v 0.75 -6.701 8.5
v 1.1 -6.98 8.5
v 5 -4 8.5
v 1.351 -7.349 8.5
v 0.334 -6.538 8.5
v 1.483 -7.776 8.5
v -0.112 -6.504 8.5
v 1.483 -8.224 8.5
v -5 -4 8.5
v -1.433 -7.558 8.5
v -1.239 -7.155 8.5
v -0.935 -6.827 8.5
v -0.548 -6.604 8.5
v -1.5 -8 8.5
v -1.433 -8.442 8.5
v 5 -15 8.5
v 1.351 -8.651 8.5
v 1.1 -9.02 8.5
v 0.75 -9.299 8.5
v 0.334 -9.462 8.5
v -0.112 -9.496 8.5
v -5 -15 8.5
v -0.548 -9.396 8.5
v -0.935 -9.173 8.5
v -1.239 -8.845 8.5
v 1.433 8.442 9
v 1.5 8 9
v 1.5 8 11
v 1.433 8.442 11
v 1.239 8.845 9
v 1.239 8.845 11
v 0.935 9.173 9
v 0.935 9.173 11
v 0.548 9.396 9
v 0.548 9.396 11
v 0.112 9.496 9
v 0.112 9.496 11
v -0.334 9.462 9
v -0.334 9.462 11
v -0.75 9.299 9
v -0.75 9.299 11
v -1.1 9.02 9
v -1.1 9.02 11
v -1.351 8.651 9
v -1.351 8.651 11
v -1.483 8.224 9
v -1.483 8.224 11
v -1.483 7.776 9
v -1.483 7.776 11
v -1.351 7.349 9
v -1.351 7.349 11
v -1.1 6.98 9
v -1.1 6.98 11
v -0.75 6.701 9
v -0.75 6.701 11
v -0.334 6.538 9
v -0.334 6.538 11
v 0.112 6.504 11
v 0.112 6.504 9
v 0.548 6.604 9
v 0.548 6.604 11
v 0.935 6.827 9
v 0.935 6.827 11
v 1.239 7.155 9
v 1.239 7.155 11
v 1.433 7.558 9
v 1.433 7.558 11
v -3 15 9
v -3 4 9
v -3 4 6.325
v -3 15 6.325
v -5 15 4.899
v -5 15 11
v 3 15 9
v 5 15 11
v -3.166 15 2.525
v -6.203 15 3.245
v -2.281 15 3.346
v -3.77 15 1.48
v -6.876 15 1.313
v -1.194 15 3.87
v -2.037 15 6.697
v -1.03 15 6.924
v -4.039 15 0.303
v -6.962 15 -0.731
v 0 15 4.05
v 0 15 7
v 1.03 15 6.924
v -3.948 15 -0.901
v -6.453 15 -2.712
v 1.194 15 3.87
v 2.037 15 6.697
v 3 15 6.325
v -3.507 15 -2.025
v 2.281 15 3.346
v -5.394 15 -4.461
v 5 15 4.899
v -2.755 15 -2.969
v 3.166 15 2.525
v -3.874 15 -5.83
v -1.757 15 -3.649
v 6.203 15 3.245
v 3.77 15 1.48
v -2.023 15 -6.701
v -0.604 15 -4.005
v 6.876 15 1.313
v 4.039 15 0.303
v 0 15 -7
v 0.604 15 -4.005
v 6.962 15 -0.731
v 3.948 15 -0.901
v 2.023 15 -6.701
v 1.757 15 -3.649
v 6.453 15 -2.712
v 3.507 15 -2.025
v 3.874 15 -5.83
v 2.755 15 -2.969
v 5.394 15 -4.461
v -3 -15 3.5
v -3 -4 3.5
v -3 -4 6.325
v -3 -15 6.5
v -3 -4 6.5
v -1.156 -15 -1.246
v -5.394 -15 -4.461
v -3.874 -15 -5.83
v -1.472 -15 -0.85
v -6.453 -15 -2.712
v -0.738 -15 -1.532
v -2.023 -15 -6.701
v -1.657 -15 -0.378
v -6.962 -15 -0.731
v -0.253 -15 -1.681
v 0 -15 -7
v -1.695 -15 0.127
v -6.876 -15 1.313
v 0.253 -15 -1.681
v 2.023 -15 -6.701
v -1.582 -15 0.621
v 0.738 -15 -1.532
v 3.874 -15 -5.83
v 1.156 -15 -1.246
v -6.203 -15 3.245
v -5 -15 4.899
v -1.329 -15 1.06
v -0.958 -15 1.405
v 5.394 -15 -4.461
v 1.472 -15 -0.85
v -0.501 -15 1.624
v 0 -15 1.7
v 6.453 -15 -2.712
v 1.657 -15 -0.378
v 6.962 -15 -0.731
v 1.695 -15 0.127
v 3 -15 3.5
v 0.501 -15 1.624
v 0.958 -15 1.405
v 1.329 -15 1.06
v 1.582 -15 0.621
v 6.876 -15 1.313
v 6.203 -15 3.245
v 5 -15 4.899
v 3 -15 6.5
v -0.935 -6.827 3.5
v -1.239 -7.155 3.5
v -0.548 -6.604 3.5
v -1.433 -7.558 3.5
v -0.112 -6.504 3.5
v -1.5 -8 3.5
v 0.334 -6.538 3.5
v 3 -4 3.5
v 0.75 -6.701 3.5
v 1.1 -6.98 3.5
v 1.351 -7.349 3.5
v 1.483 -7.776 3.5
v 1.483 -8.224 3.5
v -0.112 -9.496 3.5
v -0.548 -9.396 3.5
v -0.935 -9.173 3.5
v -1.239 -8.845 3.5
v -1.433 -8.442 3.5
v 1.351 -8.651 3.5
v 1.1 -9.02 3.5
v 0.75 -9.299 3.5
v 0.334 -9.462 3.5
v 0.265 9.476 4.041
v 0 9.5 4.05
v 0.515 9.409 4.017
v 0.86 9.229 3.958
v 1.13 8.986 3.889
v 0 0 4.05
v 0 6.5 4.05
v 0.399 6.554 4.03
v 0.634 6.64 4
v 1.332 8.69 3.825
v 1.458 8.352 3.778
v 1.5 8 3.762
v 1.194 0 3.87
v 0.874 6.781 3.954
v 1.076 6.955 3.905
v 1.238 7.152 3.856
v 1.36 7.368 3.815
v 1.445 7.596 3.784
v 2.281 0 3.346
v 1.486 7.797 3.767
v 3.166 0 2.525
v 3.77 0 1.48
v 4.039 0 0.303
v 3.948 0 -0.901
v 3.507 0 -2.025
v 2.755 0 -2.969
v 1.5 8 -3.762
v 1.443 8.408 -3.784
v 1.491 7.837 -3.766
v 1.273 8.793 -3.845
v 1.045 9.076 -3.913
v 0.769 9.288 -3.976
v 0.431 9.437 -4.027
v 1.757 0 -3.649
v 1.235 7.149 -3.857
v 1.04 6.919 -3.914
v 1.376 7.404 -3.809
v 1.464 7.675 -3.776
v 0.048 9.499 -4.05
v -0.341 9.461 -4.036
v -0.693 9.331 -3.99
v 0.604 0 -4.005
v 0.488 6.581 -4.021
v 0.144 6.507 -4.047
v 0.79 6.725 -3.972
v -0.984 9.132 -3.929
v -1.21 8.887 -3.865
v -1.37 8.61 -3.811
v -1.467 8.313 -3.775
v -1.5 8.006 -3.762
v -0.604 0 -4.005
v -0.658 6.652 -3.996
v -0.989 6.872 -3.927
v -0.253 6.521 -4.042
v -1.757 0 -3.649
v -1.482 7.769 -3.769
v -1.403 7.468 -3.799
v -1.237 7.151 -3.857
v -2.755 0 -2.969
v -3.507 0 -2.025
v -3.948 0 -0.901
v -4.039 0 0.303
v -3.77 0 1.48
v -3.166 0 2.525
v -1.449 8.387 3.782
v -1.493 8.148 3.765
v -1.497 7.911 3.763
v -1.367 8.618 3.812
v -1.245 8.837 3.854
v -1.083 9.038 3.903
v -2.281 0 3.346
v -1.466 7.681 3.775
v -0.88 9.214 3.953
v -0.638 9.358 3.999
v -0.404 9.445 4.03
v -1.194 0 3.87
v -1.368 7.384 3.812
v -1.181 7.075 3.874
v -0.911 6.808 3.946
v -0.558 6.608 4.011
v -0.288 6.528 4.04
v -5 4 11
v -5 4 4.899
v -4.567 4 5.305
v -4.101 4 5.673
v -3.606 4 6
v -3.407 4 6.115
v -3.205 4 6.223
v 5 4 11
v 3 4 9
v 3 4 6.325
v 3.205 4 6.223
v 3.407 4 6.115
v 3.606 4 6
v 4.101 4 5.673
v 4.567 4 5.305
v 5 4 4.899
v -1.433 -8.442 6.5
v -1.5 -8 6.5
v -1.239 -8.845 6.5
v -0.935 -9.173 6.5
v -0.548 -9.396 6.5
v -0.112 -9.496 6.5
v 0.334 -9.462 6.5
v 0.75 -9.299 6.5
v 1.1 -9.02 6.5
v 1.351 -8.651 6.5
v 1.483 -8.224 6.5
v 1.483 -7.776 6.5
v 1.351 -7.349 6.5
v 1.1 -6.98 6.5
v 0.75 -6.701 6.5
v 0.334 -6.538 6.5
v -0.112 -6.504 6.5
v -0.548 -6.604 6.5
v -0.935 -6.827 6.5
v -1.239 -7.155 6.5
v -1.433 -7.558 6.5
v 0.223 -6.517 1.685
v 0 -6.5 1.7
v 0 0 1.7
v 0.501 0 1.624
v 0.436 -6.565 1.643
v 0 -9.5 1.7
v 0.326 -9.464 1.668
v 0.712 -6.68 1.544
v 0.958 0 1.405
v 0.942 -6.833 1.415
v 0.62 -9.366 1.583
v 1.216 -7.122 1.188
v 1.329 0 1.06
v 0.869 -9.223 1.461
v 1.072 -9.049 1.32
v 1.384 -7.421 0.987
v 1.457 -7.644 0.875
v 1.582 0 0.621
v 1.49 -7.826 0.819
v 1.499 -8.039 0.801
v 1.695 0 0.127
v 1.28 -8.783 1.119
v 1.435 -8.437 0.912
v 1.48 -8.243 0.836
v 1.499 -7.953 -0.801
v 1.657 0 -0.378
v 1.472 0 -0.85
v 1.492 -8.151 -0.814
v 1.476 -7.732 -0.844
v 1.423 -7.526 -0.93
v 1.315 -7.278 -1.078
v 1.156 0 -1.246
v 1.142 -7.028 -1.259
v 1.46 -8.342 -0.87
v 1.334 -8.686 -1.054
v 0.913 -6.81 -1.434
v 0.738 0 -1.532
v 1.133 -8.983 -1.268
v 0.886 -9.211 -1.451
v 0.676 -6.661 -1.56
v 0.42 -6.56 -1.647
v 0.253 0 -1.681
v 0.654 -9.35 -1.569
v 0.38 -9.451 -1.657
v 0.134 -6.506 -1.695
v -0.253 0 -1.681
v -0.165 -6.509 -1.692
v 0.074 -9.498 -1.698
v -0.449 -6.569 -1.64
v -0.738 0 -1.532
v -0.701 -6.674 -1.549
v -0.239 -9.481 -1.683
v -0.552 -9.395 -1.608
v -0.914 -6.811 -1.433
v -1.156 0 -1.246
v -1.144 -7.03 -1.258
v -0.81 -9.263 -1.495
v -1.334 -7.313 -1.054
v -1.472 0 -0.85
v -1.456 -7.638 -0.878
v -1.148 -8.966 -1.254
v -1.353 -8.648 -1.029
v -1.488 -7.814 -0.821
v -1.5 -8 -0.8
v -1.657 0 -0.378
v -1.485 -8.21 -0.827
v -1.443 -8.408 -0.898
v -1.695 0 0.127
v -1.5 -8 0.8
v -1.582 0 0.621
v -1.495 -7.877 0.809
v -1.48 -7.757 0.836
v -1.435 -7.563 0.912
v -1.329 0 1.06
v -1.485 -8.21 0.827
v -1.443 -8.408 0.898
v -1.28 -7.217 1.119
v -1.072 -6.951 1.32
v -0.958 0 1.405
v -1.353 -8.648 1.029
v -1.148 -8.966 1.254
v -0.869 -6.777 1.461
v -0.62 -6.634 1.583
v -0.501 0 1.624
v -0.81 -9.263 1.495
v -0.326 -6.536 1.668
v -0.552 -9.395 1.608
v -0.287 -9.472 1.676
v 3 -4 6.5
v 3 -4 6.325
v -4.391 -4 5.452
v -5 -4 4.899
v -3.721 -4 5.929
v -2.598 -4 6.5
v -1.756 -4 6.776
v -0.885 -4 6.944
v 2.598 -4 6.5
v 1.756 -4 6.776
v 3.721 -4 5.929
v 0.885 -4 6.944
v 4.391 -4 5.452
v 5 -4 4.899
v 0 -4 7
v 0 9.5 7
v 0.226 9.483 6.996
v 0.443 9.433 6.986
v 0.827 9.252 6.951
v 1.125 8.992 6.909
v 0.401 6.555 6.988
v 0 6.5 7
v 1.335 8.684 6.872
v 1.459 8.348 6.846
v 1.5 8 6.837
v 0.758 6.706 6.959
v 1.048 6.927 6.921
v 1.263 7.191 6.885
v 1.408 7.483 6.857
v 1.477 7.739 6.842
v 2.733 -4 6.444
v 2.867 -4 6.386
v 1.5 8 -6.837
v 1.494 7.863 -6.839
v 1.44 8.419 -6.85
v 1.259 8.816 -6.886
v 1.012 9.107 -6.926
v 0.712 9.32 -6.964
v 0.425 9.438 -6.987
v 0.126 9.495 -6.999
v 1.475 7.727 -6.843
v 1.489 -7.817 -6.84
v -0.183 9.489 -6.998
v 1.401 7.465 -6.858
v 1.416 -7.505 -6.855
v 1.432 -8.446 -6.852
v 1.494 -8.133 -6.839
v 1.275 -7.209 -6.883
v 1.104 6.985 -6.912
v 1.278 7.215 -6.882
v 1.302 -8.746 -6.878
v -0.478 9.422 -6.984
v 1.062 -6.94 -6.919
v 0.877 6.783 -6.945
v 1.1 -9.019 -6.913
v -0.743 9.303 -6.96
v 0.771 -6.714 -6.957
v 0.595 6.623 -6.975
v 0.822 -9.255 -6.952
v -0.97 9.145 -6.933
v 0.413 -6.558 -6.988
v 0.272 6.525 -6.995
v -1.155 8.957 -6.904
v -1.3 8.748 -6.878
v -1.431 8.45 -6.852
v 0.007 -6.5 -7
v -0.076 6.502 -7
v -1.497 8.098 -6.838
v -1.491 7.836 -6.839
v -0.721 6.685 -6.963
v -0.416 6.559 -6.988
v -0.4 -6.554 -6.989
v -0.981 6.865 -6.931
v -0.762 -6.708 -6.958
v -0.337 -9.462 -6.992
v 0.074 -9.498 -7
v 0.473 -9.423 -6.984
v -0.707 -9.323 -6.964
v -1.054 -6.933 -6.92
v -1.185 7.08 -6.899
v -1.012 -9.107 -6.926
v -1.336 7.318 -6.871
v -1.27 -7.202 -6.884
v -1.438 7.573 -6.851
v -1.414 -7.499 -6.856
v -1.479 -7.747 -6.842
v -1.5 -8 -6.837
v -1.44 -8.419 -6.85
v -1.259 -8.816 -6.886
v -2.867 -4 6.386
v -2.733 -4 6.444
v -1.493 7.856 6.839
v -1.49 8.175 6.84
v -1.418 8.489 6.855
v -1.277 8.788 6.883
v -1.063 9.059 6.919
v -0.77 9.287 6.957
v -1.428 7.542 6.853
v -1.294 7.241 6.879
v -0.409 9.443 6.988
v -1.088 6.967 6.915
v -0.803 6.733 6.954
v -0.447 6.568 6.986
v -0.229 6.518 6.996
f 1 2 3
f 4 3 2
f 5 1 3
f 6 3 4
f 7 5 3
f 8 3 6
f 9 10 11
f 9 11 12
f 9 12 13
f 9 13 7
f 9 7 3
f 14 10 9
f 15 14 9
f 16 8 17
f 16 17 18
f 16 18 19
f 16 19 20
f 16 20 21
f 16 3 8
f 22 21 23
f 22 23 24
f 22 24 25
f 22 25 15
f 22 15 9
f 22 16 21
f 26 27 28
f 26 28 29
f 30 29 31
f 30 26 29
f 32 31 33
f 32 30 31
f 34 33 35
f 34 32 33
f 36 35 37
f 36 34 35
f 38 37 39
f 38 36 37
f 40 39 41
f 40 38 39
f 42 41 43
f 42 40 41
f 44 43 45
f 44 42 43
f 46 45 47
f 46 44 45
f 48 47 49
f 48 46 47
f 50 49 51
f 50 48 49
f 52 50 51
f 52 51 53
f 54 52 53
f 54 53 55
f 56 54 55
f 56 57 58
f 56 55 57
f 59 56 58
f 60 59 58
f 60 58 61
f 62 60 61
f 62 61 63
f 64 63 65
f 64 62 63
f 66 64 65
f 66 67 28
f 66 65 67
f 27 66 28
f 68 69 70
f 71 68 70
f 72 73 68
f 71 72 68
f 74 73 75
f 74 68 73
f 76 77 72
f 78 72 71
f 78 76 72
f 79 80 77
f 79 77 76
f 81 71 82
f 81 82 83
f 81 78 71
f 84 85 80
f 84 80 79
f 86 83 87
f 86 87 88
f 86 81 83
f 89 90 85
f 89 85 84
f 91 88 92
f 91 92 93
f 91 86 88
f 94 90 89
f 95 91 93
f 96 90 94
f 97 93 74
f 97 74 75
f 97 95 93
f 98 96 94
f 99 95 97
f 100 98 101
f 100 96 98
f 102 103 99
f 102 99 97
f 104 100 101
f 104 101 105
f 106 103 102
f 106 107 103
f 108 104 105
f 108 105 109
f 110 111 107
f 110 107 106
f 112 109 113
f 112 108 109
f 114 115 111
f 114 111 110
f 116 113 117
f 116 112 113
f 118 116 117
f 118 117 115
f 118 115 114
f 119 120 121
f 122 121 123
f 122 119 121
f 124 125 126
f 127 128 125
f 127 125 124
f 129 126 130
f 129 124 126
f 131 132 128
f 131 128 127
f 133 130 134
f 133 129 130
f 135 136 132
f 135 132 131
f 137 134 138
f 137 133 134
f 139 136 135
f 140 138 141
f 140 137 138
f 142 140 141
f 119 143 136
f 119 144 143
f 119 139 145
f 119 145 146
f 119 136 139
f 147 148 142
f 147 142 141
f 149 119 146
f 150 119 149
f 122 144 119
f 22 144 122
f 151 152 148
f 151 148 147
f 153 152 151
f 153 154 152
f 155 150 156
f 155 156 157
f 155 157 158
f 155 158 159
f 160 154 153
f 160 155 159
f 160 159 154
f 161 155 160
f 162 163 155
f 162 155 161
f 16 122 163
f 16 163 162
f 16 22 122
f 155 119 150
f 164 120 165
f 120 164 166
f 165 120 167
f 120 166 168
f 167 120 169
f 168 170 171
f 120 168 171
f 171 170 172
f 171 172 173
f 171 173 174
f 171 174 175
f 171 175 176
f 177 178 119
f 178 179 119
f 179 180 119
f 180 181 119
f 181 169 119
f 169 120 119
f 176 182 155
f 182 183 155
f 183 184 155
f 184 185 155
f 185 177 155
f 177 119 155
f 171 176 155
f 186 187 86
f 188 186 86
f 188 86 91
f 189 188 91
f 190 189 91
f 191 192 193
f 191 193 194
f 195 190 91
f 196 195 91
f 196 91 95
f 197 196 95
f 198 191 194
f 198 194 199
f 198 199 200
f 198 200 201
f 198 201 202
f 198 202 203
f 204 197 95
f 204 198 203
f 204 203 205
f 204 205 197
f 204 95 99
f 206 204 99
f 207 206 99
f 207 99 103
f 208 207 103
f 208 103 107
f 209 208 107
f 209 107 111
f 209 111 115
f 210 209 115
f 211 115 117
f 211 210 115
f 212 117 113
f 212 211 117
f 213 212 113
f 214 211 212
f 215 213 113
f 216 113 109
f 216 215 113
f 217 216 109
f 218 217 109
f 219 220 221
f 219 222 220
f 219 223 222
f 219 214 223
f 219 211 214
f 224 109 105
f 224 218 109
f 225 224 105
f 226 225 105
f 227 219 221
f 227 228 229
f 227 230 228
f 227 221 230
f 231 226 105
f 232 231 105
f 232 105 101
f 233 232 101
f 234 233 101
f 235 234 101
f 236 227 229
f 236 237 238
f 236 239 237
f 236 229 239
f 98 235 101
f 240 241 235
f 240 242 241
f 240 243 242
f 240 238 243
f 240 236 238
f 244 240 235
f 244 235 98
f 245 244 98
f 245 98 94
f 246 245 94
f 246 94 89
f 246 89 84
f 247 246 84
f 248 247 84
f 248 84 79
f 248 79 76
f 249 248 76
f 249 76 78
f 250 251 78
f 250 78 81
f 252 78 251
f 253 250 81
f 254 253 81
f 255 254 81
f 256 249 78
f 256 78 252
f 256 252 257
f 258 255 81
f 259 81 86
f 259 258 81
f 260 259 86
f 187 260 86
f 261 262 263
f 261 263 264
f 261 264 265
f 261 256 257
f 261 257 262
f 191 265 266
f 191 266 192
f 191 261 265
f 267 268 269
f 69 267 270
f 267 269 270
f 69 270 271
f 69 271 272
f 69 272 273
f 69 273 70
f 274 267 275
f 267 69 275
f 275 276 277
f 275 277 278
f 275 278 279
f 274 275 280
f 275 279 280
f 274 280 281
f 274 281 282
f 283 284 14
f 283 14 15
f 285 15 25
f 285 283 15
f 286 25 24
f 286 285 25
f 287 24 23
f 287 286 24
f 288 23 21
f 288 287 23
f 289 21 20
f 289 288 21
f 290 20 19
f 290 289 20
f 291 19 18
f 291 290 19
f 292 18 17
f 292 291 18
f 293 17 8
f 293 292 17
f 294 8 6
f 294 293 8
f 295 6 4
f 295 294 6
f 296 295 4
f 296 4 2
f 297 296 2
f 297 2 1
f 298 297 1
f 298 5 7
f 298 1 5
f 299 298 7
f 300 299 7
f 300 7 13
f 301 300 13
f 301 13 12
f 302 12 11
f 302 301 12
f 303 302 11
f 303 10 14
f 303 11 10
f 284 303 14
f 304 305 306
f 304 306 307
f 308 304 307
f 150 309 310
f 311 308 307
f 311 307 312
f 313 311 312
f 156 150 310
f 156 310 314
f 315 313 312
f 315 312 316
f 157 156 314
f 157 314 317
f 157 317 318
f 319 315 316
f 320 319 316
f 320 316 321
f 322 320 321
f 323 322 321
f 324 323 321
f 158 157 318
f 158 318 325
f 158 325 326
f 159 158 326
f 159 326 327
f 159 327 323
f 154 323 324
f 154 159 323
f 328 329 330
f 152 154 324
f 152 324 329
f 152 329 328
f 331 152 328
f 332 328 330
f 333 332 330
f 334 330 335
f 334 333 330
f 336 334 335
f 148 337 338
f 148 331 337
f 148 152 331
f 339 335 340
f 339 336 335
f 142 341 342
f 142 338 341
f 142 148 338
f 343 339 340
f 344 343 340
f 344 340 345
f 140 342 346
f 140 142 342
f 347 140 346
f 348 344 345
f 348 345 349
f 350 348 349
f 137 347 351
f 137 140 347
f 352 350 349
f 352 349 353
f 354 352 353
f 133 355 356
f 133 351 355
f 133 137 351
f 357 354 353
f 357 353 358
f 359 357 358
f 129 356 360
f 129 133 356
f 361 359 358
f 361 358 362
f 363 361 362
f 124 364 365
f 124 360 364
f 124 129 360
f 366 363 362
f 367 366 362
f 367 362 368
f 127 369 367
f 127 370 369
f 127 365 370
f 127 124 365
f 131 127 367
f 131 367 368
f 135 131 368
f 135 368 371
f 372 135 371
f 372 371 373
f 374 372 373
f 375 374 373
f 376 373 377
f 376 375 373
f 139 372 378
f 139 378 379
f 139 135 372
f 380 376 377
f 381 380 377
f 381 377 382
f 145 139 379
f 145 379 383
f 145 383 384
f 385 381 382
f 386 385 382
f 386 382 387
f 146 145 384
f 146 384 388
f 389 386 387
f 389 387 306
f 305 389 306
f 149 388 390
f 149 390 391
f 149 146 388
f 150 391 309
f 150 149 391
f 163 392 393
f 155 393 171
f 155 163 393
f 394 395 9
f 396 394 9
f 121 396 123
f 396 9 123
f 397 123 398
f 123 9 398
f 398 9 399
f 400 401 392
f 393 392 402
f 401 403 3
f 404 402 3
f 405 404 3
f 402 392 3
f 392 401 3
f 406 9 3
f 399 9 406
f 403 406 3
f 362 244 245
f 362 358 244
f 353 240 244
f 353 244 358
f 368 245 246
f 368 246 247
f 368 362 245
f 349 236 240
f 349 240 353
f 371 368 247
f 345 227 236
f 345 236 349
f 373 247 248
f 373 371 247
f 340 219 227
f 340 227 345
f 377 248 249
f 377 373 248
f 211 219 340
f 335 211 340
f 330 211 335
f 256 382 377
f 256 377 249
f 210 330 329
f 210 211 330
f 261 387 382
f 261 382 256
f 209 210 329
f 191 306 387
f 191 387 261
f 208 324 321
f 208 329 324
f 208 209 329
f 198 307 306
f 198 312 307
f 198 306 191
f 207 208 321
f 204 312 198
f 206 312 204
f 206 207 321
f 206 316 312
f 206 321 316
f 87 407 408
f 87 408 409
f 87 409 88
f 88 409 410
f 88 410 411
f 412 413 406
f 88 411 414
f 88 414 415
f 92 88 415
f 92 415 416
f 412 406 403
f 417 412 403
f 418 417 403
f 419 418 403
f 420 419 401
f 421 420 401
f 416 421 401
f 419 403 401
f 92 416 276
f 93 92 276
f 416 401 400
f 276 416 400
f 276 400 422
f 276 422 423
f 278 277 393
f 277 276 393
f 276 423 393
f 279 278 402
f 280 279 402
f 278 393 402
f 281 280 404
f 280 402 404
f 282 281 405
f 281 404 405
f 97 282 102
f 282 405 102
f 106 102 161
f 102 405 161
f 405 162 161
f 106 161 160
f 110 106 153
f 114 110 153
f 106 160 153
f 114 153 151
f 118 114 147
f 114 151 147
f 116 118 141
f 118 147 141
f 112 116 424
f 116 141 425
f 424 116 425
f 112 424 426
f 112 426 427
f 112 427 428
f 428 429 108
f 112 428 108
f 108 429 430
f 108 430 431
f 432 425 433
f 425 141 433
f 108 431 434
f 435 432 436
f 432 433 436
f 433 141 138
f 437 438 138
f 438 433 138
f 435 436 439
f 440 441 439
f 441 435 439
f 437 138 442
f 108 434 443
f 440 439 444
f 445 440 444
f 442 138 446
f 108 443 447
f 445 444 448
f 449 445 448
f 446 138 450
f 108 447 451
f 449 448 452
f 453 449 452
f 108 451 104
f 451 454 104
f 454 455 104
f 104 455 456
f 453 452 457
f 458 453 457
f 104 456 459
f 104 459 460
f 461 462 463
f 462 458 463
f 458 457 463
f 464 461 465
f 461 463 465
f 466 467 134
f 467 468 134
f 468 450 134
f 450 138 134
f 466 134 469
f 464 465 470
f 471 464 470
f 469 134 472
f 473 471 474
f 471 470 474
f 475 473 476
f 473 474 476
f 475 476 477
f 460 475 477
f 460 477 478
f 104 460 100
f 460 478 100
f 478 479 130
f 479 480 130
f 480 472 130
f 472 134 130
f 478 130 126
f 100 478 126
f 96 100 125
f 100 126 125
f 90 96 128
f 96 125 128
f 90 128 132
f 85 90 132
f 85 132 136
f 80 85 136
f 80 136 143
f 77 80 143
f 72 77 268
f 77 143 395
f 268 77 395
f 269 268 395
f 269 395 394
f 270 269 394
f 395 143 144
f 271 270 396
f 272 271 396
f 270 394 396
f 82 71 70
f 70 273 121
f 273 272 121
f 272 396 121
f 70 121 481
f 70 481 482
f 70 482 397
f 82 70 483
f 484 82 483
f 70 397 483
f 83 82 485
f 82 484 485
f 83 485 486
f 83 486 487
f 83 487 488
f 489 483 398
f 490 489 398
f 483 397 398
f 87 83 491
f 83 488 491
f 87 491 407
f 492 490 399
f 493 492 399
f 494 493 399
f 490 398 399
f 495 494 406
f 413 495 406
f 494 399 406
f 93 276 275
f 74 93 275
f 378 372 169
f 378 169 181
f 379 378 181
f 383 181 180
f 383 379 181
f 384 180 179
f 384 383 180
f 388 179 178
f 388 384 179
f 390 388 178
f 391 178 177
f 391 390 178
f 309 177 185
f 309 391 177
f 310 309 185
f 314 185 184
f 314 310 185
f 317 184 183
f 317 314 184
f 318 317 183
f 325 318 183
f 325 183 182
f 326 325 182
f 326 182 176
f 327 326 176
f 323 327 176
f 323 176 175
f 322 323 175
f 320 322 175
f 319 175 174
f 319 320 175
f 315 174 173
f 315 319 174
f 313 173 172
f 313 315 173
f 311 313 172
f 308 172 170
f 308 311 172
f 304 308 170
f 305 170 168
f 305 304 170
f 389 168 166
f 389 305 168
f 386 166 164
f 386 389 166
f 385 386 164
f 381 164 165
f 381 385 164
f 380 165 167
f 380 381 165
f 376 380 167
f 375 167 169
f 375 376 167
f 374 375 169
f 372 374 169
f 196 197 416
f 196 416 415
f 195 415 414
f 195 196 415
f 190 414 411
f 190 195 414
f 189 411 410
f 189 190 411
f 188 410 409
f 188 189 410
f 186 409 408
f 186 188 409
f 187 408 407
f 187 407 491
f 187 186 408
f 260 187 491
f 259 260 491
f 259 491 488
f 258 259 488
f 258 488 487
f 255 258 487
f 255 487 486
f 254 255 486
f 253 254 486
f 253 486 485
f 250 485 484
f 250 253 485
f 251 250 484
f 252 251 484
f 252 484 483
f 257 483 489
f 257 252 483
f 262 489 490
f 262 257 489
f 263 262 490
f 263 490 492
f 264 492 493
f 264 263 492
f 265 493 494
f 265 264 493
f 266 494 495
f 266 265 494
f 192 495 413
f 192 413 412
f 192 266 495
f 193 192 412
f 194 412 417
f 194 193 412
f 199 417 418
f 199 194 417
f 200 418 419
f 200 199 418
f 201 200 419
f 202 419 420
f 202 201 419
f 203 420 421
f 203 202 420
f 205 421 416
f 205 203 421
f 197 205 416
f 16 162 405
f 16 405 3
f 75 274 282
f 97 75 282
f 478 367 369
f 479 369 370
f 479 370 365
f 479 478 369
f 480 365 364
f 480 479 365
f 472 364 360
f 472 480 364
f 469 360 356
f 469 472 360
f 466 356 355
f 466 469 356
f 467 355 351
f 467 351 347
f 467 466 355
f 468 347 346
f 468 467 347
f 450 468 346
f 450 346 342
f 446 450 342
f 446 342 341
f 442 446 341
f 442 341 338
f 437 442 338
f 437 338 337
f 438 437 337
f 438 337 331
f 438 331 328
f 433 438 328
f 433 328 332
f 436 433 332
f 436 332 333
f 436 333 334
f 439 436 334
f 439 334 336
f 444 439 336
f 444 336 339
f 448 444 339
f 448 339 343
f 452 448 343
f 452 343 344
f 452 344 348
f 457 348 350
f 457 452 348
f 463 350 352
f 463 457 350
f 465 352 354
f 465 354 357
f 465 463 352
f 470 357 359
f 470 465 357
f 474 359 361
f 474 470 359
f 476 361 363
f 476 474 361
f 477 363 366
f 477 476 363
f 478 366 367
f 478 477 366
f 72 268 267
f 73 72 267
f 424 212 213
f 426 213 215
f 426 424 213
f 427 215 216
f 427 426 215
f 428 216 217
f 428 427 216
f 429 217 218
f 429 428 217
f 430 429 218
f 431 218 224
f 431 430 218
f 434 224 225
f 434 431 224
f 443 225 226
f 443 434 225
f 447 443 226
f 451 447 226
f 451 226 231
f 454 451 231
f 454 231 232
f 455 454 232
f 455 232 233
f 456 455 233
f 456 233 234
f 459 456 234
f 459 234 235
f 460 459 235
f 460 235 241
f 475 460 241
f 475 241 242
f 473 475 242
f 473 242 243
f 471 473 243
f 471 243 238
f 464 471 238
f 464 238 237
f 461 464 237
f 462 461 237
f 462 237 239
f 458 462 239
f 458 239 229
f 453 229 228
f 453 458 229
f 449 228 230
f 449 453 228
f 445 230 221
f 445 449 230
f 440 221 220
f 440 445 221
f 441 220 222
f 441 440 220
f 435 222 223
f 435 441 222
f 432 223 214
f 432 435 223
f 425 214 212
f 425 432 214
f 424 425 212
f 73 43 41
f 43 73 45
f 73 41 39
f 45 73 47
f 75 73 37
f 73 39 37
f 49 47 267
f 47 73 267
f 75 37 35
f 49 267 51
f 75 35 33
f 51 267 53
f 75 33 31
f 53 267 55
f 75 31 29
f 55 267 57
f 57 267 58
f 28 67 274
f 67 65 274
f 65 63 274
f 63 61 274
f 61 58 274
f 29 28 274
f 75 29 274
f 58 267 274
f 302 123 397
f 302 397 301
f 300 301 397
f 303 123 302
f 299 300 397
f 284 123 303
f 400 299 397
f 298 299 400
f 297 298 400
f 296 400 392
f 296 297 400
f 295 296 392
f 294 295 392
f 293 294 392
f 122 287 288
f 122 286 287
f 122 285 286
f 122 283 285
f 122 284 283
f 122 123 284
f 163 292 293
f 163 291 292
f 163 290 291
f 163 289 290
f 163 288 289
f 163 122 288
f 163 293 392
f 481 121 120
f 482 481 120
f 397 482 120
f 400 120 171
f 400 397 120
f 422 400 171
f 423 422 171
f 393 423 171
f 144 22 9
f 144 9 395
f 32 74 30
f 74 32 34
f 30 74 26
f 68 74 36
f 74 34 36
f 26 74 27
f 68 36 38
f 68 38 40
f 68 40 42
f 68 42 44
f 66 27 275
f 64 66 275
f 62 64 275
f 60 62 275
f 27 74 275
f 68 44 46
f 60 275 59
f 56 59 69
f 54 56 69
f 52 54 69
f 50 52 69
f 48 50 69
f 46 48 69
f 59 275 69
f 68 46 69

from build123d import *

# Parameters (mm, degrees)
SKETCH1_R               = 7
SKETCH1_R_2             = 4.05
BOSS_EXTRUDE1_DEPTH     = 15
BOSS_EXTRUDE2_START     = -15
SKETCH1_3_R             = 7
SKETCH1_3_R_2           = 1.7
BOSS_EXTRUDE2_DEPTH     = 15
CUT_EXTRUDE2_DEPTH      = 11
BOSS_EXTRUDE3_DEPTH     = 11
BOSS_EXTRUDE4_START     = -11
SKETCH4_W               = 10
SKETCH4_H               = 6.101020514
BOSS_EXTRUDE4_DEPTH     = 11
CUT_EXTRUDE1_DEPTH      = 20.874606914
CUT_EXTRUDE1_DEPTH_BACK = 20.874606914
SKETCH2_R               = 1.5


with BuildPart() as part:
    # Sketch1 → Boss-Extrude1 (new body)
    with BuildSketch(Plane(origin=(0, 0, 0), x_dir=(1, 0, 0), z_dir=(0, 1, 0))):
        Circle(SKETCH1_R)
        Circle(SKETCH1_R_2, mode=Mode.SUBTRACT)
    extrude(amount=BOSS_EXTRUDE1_DEPTH)

    # Sketch1<3> → Boss-Extrude2 (add)
    with BuildSketch(Plane(origin=(0, 0, 0), x_dir=(1, 0, 0), z_dir=(0, 1, 0)).offset(BOSS_EXTRUDE2_START)):
        Circle(SKETCH1_3_R)
        Circle(SKETCH1_3_R_2, mode=Mode.SUBTRACT)
    extrude(amount=BOSS_EXTRUDE2_DEPTH)

    # Sketch3 → Cut-Extrude2 (cut)
    with BuildSketch(Plane.XZ.offset(15)):
        with BuildLine():
            Line((2.598076211, 6.5), (-2.598076211, 6.5))
            ThreePointArc((-2.598076211, 6.5), (-2.800412385, 6.415425978), (-3, 6.32455532))
            Line((-3, 6.32455532), (-3, 3.5))
            Line((-3, 3.5), (3, 3.5))
            Line((3, 3.5), (3, 6.32455532))
            ThreePointArc((3, 6.32455532), (2.800412385, 6.415425978), (2.598076211, 6.5))
        make_face()
    extrude(amount=-CUT_EXTRUDE2_DEPTH, mode=Mode.SUBTRACT)

    # Sketch3<3> → Boss-Extrude3 (add)
    with BuildSketch(Plane.XZ.offset(15)):
        with BuildLine():
            Line((-3, 6.32455532), (-3, 6.5))
            Line((-3, 6.5), (-2.598076211, 6.5))
            ThreePointArc((-2.598076211, 6.5), (0, 7), (2.598076211, 6.5))
            Line((2.598076211, 6.5), (3, 6.5))
            Line((3, 6.5), (3, 6.32455532))
            ThreePointArc((3, 6.32455532), (4.063012013, 5.700169593), (5, 4.898979486))
            Line((5, 4.898979486), (5, 8.5))
            Line((5, 8.5), (-5, 8.5))
            Line((-5, 8.5), (-5, 4.898979486))
            ThreePointArc((-5, 4.898979486), (-4.063012013, 5.700169593), (-3, 6.32455532))
        make_face()
    extrude(amount=-BOSS_EXTRUDE3_DEPTH)

    # Sketch4 → Boss-Extrude4 (add)
    with BuildSketch(Plane(origin=(0, 15, 0), x_dir=(1, 0, 0), z_dir=(0, 1, 0)).offset(BOSS_EXTRUDE4_START)):
        with Locations((0, -7.949489743)):
            Rectangle(SKETCH4_W, SKETCH4_H)
        with BuildLine():
            Line((-3.605551275, -6), (3.605551275, -6))
            ThreePointArc((3.605551275, -6), (3.306759887, -6.169711423), (3, -6.32455532))
            Line((3, -6.32455532), (3, -9))
            Line((3, -9), (-3, -9))
            Line((-3, -9), (-3, -6.32455532))
            ThreePointArc((-3, -6.32455532), (-3.306759887, -6.169711423), (-3.605551275, -6))
        make_face(mode=Mode.SUBTRACT)
    extrude(amount=BOSS_EXTRUDE4_DEPTH)

    # Sketch2 → Cut-Extrude1 (cut, two sides: drawn at the far end of the back side and taken through both)
    with BuildSketch(Plane.XY.offset(-CUT_EXTRUDE1_DEPTH_BACK)):
        with Locations((0, 8)):
            Circle(SKETCH2_R)
        with Locations((0, -8)):
            Circle(SKETCH2_R)
    extrude(amount=CUT_EXTRUDE1_DEPTH + CUT_EXTRUDE1_DEPTH_BACK, mode=Mode.SUBTRACT)


solid = part.part
